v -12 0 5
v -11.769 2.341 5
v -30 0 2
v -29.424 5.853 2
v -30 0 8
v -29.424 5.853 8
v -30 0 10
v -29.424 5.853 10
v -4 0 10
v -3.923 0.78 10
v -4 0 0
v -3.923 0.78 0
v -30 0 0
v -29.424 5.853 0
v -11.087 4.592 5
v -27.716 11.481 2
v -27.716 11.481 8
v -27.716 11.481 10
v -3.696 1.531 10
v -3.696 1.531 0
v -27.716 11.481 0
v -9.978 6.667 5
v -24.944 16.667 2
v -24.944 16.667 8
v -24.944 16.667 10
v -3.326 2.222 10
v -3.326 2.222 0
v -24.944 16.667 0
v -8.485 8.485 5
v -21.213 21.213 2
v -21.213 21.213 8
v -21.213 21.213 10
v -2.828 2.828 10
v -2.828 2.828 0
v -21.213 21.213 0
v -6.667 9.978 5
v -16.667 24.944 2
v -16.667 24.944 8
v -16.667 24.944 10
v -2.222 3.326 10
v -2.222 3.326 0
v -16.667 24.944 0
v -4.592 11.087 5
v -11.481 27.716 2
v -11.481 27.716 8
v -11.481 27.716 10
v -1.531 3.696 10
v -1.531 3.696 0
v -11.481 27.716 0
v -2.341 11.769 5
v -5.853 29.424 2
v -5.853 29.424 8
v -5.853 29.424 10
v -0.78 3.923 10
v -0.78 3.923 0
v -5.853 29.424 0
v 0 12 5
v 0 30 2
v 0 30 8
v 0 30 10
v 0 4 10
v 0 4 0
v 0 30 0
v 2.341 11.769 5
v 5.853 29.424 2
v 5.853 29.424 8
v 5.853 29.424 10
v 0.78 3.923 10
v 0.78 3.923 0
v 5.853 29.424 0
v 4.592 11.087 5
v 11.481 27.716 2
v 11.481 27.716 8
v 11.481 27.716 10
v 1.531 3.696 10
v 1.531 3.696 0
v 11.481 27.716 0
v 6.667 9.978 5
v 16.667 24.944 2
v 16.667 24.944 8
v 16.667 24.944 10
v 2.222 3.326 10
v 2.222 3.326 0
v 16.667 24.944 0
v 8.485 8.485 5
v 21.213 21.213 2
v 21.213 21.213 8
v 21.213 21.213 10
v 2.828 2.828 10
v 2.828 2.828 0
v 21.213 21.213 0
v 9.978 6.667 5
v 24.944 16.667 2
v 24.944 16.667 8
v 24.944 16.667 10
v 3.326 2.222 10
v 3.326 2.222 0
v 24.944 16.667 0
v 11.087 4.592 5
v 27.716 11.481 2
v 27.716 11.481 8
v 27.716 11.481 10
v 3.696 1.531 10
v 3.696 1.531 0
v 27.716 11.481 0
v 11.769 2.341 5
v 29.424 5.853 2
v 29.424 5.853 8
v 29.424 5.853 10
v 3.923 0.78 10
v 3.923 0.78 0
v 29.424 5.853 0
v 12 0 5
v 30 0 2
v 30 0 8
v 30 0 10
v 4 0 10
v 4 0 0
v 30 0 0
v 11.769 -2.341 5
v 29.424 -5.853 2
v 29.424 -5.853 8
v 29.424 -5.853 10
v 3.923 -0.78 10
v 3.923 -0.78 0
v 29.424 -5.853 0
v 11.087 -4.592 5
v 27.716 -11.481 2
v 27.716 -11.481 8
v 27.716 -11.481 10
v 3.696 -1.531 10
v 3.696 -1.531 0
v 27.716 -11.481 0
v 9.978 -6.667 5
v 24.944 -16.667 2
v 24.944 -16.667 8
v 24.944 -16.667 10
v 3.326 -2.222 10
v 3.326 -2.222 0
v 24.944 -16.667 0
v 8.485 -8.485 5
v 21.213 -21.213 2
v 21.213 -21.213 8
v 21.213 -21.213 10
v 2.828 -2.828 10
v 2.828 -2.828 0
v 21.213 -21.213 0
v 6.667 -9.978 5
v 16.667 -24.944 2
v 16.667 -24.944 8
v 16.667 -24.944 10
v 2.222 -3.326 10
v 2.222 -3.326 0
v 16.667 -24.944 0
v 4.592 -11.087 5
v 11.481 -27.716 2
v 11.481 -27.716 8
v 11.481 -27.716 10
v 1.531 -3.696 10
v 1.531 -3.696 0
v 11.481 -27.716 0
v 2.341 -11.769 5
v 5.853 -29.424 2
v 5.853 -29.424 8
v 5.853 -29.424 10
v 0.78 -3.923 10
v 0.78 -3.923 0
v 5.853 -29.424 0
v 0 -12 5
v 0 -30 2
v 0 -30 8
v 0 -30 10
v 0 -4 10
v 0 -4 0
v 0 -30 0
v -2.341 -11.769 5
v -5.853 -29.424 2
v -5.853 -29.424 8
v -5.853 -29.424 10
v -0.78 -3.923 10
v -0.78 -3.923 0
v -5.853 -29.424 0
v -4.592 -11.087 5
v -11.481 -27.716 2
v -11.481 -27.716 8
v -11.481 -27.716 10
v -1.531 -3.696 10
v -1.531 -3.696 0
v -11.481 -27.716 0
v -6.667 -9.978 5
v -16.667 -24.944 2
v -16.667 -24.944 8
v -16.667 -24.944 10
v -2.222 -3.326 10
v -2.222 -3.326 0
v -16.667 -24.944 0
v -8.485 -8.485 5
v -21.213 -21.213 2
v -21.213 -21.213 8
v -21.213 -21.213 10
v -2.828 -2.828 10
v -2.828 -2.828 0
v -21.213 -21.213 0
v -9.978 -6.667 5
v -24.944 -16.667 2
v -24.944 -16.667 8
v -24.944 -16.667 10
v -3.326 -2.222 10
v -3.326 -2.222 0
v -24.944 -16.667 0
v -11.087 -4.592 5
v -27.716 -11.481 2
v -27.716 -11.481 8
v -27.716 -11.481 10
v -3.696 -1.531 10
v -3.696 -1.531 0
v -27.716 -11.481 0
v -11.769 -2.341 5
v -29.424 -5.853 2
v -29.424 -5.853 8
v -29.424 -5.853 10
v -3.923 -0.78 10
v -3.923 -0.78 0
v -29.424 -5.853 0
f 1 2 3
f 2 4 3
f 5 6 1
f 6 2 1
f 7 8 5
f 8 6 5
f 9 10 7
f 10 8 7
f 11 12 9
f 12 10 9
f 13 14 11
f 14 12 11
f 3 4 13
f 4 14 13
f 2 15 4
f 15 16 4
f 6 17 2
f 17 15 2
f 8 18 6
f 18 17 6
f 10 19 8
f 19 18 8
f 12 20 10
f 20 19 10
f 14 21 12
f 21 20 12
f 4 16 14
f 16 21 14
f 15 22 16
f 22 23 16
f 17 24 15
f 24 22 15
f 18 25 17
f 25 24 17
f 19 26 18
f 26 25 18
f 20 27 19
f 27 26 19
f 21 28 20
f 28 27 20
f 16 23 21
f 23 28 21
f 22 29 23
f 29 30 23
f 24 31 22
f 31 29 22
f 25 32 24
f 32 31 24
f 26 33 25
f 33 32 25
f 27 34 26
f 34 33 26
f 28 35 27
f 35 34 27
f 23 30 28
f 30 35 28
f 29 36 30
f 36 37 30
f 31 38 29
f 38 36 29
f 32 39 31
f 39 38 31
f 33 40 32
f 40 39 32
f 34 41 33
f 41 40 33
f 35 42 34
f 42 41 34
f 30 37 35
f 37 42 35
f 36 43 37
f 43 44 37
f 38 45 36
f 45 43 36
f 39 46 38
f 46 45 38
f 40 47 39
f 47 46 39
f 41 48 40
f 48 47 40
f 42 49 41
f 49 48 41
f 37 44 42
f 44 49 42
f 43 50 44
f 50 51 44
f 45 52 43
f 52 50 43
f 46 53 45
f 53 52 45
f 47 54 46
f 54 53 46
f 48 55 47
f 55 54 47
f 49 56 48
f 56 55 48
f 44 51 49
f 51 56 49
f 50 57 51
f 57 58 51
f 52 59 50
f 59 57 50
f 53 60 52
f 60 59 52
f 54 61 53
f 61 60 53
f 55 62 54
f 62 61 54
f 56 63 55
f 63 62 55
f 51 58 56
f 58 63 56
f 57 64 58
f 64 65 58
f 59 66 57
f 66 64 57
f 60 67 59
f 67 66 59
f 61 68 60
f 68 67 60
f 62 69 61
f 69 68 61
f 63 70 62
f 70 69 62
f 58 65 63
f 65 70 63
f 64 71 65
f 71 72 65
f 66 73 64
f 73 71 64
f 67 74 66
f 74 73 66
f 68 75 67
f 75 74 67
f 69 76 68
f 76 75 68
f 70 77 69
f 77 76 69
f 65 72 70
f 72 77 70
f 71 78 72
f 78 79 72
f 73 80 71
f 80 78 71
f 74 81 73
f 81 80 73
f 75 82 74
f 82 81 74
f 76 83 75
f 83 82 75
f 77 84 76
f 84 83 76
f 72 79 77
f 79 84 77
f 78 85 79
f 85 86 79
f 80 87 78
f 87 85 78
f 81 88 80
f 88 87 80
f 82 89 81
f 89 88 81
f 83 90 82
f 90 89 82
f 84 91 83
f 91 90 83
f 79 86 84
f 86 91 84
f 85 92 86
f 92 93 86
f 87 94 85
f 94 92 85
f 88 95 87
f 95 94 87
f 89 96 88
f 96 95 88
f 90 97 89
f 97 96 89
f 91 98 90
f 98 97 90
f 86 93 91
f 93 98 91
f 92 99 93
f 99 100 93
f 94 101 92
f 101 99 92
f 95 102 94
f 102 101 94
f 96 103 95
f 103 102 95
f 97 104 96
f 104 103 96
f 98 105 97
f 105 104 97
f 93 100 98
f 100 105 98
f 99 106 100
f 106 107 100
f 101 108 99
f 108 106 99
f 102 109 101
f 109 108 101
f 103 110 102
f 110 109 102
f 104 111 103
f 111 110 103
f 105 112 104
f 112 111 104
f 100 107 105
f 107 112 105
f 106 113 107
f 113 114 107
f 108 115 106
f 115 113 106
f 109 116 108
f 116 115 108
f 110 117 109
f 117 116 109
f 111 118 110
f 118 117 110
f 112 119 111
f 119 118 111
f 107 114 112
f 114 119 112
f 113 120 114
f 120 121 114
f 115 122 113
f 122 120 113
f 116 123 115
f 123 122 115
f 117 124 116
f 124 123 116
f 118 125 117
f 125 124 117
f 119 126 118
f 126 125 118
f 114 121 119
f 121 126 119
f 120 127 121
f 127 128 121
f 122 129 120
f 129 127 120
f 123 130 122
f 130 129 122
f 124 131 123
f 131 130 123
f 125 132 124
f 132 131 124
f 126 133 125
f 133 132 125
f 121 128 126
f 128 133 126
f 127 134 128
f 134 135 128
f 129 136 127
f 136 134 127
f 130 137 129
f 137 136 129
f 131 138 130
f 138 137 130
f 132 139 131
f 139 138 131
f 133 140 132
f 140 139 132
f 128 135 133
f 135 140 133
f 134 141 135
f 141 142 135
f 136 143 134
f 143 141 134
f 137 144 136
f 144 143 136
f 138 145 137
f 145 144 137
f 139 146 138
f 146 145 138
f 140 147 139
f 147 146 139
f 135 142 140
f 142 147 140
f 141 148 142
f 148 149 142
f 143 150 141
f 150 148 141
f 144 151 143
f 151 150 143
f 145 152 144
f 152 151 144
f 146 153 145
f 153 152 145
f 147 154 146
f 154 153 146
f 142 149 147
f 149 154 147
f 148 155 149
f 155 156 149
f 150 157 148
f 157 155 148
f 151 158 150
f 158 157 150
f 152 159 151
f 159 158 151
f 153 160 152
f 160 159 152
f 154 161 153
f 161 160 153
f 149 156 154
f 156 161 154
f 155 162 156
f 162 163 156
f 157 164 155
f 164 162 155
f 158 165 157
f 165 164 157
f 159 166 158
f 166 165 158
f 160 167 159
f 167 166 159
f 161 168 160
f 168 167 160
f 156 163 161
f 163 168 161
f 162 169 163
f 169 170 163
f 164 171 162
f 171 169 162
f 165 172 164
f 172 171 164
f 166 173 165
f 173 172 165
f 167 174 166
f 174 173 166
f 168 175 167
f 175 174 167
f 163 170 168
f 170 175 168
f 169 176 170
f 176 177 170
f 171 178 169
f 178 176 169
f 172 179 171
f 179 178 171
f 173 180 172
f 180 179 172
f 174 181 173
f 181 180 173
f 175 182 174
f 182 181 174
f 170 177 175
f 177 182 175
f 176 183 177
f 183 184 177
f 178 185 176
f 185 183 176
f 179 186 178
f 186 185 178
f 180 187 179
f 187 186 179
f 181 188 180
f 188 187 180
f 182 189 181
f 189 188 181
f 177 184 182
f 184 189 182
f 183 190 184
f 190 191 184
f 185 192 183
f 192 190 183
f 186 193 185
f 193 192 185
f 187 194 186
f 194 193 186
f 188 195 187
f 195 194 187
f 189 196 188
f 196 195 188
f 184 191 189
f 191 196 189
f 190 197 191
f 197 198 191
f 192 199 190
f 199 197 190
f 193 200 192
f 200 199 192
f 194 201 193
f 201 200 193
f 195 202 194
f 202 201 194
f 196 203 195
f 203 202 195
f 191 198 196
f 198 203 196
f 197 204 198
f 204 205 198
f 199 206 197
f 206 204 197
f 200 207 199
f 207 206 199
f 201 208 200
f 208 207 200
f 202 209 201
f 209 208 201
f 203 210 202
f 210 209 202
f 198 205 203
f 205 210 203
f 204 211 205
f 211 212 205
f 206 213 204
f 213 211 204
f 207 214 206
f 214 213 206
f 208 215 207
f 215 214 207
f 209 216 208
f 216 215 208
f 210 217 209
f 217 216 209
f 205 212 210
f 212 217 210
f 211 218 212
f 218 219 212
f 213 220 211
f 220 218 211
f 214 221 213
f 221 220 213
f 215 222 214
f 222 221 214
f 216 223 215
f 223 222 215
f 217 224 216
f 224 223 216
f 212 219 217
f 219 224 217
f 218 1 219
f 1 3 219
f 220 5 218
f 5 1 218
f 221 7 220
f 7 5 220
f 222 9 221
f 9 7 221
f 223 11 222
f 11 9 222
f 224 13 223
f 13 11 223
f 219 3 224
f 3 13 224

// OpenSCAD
$fn = 32;

// ----------------------------------------------------------------------
// Revolved part: V-groove pulley R30
// ----------------------------------------------------------------------

// --- parameters (mm) ---
bore_r = 4;               // bore radius
rim_r = 30;               // rim radius
rim_t = 10;               // rim width
groove_r = 12;            // groove root radius
groove_w = 3;             // groove half width
revolve_angle = 360;      // revolve sweep, degrees

bore_d = 2 * bore_r;
rim_d = 2 * rim_r;
groove_d = 2 * groove_r;

profile = [[4, 0], [30, 0], [30, 2], [12, 5], [30, 8], [30, 10], [4, 10]];  // primary outline, 7 points, counter clockwise

// --- the one profile operation ---
rotate_extrude(angle = revolve_angle) polygon(points = profile);
